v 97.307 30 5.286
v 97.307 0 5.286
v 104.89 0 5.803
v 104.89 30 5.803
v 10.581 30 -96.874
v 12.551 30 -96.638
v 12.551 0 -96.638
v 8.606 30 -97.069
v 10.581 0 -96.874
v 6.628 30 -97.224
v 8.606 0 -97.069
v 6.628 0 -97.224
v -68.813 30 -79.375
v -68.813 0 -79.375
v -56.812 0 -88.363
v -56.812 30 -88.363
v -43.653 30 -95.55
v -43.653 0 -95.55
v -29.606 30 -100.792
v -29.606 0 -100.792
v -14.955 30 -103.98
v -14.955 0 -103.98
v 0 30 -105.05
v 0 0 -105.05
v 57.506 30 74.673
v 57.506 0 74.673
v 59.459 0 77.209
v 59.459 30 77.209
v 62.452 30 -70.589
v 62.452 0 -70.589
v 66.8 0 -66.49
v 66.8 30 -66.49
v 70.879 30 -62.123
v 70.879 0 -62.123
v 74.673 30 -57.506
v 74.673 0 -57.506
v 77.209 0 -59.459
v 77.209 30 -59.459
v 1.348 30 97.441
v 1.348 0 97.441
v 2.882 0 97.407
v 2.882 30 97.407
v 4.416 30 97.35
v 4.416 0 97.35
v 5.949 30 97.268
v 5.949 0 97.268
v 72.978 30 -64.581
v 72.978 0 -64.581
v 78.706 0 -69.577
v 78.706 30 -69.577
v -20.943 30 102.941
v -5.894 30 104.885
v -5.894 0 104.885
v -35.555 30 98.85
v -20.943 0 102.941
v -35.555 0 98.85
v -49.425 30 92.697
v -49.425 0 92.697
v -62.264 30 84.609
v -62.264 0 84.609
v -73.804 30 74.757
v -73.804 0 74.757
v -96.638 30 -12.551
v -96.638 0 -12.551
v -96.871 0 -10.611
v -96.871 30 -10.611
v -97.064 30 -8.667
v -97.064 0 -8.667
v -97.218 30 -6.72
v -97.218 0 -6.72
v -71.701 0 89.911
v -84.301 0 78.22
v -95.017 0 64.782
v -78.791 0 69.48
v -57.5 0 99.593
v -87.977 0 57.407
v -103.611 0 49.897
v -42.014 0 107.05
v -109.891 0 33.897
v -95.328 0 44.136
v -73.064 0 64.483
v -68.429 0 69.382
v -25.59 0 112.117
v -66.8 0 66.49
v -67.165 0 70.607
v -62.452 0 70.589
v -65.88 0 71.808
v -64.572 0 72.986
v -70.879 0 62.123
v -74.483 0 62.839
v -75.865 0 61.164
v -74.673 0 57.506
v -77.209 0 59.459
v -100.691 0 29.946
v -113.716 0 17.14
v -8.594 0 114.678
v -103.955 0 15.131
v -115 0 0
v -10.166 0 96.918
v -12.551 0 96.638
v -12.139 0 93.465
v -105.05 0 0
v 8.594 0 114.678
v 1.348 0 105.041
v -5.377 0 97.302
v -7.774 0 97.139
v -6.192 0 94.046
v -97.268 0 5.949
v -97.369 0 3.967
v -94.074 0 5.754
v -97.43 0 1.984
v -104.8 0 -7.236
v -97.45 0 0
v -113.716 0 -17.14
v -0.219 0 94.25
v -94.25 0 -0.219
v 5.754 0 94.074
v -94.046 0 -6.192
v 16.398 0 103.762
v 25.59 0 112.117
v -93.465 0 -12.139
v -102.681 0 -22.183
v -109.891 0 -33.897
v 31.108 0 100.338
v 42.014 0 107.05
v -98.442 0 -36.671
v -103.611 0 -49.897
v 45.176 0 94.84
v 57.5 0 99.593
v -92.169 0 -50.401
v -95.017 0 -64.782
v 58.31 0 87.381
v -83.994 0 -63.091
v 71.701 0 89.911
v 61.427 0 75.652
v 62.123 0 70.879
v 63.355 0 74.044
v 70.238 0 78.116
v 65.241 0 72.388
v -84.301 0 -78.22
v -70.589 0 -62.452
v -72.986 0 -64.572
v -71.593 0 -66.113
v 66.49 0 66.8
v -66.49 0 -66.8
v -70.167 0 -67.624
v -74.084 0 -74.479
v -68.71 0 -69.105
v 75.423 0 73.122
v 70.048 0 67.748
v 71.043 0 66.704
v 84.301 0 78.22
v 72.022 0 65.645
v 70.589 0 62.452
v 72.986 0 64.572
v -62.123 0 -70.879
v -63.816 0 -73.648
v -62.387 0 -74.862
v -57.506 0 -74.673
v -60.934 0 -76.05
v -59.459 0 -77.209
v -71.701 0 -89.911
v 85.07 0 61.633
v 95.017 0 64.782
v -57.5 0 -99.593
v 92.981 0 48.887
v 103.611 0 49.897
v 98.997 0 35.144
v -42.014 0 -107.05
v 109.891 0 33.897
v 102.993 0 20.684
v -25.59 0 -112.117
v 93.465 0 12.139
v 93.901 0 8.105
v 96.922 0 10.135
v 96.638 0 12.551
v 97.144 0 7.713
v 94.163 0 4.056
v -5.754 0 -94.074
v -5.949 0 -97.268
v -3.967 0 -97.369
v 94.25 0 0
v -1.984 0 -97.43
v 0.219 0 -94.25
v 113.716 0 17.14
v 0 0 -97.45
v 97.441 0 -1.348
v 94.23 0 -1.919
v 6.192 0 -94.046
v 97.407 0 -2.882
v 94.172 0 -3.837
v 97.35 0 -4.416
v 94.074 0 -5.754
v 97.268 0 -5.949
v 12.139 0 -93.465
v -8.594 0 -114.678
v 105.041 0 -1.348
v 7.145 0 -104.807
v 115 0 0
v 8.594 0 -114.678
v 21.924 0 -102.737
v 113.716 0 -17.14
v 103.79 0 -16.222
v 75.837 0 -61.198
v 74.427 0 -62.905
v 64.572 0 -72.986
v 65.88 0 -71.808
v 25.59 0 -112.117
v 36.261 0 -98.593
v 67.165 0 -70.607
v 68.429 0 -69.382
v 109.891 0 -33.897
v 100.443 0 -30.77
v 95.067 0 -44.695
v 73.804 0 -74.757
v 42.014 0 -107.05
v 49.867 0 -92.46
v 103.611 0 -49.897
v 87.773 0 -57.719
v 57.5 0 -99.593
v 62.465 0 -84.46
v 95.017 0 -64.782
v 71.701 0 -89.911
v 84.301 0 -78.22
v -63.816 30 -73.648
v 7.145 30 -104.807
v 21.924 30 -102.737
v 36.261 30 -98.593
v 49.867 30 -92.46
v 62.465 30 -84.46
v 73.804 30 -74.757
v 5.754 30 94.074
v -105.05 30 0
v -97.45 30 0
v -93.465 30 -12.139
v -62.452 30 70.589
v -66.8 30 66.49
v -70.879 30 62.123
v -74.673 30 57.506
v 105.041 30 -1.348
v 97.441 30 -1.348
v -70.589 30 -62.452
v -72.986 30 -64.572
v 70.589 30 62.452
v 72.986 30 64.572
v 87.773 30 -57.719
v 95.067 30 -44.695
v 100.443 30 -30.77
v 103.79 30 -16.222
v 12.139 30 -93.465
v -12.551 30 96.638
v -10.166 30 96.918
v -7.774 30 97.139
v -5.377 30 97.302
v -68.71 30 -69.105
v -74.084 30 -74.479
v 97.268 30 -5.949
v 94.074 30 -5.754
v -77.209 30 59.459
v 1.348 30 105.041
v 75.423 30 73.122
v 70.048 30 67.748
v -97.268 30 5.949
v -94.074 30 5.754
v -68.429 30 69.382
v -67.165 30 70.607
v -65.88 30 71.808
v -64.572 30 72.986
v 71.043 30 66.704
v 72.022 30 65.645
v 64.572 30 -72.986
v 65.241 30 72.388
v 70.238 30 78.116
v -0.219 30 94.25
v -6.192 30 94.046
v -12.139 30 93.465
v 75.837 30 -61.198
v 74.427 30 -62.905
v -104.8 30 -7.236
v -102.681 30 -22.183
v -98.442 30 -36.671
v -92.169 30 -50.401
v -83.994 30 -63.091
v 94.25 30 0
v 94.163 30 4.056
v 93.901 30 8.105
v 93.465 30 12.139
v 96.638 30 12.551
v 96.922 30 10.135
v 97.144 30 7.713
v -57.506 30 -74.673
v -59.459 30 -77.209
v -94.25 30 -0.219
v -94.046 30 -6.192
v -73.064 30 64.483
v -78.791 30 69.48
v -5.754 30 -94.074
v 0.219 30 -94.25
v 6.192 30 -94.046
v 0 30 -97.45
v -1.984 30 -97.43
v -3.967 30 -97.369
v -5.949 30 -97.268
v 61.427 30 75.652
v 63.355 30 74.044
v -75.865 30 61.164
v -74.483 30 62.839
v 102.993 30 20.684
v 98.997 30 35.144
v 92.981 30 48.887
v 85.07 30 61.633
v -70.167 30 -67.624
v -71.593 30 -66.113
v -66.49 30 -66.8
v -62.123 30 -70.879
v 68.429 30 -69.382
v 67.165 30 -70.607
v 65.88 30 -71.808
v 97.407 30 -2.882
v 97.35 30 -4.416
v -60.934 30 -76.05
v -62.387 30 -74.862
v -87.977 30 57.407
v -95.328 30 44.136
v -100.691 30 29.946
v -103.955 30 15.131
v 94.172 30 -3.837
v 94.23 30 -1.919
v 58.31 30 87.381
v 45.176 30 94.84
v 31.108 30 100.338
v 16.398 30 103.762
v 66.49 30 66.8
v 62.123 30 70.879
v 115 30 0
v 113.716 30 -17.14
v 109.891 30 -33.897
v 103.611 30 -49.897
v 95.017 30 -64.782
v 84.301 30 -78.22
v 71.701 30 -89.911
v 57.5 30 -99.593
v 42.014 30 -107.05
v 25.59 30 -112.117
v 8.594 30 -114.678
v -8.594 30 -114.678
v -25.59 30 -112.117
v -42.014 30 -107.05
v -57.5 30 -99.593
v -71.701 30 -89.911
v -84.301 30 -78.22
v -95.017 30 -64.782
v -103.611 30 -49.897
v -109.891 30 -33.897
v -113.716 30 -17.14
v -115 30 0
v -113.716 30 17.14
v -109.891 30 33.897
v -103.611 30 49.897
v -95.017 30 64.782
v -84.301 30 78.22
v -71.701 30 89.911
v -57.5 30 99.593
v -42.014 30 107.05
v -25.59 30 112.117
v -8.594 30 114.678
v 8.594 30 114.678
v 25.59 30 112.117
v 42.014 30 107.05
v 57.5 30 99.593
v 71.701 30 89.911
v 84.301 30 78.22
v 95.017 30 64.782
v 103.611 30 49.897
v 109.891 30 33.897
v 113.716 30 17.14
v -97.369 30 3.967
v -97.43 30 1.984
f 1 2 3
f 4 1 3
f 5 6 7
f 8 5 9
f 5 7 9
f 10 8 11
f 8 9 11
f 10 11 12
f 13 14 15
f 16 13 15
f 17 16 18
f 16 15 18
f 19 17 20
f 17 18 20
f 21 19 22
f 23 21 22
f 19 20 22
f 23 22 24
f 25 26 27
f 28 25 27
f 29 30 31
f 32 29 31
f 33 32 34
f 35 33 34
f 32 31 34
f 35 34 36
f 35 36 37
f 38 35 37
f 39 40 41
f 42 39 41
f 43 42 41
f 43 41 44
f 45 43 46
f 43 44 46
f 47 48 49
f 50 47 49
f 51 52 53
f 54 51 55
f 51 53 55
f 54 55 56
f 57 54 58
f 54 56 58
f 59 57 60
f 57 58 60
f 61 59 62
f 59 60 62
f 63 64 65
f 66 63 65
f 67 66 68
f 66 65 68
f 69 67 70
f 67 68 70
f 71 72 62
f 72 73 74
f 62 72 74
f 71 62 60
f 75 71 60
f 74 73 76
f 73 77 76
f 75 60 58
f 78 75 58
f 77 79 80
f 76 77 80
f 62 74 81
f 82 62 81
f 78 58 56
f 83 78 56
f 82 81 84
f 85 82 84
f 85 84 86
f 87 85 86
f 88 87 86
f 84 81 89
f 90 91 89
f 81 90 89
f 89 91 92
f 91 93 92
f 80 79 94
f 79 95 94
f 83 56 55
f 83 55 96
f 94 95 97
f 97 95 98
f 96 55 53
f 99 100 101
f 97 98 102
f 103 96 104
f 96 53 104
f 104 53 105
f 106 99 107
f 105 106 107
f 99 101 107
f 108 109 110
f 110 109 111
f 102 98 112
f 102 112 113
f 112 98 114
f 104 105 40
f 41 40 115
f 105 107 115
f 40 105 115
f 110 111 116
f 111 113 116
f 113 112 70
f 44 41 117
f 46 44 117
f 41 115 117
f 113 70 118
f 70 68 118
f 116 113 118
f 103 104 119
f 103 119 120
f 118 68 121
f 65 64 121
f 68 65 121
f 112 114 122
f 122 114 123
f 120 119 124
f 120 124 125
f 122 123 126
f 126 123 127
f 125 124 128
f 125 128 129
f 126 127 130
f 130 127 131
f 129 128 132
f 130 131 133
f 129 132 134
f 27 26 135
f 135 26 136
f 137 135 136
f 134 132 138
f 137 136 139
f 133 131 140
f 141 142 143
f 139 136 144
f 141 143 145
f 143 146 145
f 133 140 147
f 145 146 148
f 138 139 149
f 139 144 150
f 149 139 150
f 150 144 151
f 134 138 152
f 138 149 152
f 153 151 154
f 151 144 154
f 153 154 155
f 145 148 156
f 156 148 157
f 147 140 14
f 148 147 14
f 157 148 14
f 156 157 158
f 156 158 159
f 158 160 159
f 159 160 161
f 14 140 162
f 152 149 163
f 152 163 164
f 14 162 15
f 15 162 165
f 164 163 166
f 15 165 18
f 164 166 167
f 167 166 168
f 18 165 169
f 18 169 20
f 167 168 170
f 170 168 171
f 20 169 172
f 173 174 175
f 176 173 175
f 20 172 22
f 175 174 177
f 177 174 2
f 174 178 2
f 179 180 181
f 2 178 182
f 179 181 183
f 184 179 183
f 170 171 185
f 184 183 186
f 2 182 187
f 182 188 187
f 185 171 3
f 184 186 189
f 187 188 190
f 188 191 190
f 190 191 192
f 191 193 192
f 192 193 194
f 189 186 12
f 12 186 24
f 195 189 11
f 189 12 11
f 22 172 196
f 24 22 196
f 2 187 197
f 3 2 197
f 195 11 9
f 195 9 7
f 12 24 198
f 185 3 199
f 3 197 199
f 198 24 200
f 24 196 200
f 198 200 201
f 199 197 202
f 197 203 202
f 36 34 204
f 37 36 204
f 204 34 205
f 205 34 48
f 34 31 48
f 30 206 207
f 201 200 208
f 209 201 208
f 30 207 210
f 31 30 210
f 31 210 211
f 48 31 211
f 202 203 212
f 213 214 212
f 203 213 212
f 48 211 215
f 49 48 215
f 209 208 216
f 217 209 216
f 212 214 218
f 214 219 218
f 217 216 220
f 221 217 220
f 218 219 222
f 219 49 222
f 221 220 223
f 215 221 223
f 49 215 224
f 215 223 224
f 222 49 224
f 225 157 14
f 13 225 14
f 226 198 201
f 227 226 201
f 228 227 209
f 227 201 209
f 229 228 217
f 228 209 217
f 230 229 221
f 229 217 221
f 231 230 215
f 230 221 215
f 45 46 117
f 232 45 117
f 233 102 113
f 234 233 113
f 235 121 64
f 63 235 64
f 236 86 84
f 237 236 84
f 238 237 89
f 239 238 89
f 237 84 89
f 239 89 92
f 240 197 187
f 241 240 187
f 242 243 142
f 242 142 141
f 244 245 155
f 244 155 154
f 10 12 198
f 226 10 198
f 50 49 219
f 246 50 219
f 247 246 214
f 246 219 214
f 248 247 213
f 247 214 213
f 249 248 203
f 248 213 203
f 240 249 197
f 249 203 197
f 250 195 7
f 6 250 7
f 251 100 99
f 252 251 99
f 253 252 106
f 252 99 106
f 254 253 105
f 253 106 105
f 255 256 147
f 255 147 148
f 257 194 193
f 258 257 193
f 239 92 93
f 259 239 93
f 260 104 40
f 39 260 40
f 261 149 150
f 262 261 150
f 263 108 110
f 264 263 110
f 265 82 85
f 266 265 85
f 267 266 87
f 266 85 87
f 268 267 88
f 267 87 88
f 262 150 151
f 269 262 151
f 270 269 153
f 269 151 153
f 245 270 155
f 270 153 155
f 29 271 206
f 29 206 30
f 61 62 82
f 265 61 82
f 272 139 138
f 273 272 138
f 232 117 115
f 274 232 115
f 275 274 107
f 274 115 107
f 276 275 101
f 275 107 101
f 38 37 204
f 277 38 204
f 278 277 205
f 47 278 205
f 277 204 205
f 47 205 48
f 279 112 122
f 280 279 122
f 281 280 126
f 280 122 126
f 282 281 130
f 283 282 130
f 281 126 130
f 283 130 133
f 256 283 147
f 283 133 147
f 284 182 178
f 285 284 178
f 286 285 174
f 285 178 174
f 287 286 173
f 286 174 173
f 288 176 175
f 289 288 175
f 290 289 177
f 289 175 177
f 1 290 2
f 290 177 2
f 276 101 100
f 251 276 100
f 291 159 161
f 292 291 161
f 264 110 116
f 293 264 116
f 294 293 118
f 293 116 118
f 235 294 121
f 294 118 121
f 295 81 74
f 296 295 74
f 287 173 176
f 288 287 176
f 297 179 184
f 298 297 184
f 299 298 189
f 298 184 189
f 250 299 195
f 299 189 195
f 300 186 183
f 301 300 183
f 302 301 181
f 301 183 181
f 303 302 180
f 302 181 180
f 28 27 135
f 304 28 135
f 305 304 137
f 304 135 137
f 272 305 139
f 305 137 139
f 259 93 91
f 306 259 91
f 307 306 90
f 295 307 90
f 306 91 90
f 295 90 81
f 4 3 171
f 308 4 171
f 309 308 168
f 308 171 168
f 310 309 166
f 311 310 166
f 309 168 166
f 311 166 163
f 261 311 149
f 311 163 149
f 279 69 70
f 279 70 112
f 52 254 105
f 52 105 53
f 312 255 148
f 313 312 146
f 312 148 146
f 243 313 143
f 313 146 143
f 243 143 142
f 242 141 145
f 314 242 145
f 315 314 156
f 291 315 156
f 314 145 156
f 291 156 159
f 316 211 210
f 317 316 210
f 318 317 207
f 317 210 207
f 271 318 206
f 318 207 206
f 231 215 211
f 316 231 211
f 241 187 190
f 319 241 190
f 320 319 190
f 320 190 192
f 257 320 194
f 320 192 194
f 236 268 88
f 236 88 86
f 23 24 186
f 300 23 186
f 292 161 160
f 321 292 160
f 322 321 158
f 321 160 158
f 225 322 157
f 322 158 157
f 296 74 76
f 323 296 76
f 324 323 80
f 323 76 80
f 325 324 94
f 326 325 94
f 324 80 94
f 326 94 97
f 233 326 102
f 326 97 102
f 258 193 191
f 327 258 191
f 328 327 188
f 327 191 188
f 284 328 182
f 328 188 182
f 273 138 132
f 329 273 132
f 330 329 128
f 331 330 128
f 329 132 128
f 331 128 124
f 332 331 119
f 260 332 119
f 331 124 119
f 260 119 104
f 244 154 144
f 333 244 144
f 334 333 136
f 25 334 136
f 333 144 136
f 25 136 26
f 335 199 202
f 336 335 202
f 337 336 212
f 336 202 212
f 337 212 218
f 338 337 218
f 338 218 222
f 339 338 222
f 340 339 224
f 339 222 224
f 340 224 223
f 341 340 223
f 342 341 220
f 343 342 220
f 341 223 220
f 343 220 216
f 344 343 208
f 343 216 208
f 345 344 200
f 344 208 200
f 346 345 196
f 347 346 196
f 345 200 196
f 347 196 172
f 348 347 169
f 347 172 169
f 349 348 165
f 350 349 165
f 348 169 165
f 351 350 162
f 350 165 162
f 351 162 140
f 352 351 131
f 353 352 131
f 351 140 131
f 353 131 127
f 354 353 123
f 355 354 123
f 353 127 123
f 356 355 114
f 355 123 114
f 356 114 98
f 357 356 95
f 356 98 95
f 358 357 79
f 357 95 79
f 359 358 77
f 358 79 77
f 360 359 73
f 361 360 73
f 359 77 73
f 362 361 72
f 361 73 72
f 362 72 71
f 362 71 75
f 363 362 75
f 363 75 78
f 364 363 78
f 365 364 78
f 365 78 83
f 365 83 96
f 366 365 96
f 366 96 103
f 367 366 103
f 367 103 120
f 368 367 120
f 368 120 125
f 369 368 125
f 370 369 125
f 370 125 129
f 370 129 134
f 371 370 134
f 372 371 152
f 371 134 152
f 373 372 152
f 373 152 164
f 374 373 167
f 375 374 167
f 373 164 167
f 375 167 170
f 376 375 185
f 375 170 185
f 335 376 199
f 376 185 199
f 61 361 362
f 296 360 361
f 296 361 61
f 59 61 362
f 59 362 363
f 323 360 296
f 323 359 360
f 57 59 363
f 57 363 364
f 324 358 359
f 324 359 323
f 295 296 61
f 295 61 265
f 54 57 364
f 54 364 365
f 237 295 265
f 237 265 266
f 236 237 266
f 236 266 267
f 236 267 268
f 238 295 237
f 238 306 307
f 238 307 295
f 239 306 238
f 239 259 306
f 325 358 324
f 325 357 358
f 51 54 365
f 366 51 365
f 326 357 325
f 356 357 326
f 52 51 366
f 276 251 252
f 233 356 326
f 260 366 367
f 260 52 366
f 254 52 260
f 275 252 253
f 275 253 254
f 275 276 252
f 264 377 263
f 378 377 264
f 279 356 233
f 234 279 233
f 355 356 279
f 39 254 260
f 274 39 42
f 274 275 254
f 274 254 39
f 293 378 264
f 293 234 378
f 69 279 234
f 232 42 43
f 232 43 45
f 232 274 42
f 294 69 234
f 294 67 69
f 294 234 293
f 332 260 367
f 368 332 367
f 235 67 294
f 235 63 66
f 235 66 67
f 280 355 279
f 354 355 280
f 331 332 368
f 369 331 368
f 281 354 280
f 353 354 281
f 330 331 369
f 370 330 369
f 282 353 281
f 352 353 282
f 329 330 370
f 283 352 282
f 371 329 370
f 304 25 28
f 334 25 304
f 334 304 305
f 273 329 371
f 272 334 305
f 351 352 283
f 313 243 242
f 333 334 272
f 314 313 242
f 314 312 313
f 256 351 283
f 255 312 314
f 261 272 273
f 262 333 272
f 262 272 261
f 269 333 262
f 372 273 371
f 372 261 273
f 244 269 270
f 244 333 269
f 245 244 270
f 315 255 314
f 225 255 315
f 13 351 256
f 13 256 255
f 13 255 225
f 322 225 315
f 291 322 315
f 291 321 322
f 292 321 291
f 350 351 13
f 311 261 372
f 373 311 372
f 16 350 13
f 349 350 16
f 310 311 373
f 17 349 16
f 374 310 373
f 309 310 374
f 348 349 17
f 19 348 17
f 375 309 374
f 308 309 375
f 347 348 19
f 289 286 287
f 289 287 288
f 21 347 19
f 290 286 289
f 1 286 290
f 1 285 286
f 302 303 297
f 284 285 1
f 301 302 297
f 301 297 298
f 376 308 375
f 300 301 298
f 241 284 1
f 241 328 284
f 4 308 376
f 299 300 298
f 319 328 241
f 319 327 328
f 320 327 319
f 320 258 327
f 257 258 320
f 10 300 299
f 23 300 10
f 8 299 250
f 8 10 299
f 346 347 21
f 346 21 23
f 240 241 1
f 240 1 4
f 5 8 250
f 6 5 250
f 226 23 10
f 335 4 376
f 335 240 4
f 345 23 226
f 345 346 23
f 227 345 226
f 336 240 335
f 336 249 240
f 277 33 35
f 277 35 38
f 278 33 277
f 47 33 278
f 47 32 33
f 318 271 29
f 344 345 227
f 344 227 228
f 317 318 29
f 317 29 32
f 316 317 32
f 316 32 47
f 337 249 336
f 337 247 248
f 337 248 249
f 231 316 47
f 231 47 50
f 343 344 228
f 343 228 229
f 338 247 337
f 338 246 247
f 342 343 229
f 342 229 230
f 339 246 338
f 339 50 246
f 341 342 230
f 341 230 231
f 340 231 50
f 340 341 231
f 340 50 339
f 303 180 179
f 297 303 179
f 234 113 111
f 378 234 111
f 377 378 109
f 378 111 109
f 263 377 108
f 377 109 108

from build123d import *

# Parameters (mm, degrees)
SKETCH1_R           = 115
BOSS_EXTRUDE1_DEPTH = 30


with BuildPart() as part:
    # Sketch1 → Boss-Extrude1 (new body)
    with BuildSketch(Plane(origin=(0, 0, 0), x_dir=(1, 0, 0), z_dir=(0, 1, 0))):
        Circle(SKETCH1_R)
        with BuildLine():
            Line((0, 105.05), (0, 97.45))
            ThreePointArc((0, 97.45), (-2.975978112, 97.404548427), (-5.949180178, 97.268236106))
            Line((-5.949180178, 97.268236106), (-5.753824851, 94.074204751))
            ThreePointArc((-5.753824851, 94.074204751), (3.207077785, 94.195420016), (12.138984977, 93.465007055))
            Line((12.138984977, 93.465007055), (12.551130886, 96.638354774))
            ThreePointArc((12.551130886, 96.638354774), (9.59408525, 96.976574636), (6.628090075, 97.224332973))
            Line((6.628090075, 97.224332973), (7.145006284, 104.806733492))
            ThreePointArc((7.145006284, 104.806733492), (43.173122748, 95.768387123), (73.803507095, 74.756570551))
            Line((73.803507095, 74.756570551), (68.429376346, 69.382439802))
            ThreePointArc((68.429376346, 69.382439802), (66.525250753, 71.210206517), (64.572323699, 72.985734991))
            Line((64.572323699, 72.985734991), (62.451939544, 70.589076684))
            ThreePointArc((62.451939544, 70.589076684), (68.8739667, 64.338473801), (74.673298886, 57.506181698))
            Line((74.673298886, 57.506181698), (77.208625745, 59.458646222))
            ThreePointArc((77.208625745, 59.458646222), (75.137185677, 62.055667175), (72.978432671, 64.580576529))
            Line((72.978432671, 64.580576529), (78.705648152, 69.576745031))
            ThreePointArc((78.705648152, 69.576745031), (98.00273537, 37.828115999), (105.041353, 1.347835265))
            Line((105.041353, 1.347835265), (97.44067857, 1.347835265))
            ThreePointArc((97.44067857, 1.347835265), (97.381638194, 3.649526366), (97.268236106, 5.949180178))
            Line((97.268236106, 5.949180178), (94.074204751, 5.753824851))
            ThreePointArc((94.074204751, 5.753824851), (94.206040936, 2.87825487), (94.25, 0))
            ThreePointArc((94.25, 0), (94.053547022, -6.082170053), (93.465007055, -12.138984977))
            Line((93.465007055, -12.138984977), (96.638354774, -12.551130886))
            ThreePointArc((96.638354774, -12.551130886), (97.040462342, -8.92475033), (97.306537269, -5.285858937))
            Line((97.306537269, -5.285858937), (104.889607544, -5.802820805))
            ThreePointArc((104.889607544, -5.802820805), (96.234836599, -42.123137642), (75.423107292, -73.122208571))
            Line((75.423107292, -73.122208571), (70.048400827, -67.747502106))
            ThreePointArc((70.048400827, -67.747502106), (71.534686983, -66.176212178), (72.985734991, -64.572323699))
            Line((72.985734991, -64.572323699), (70.589076684, -62.451939544))
            ThreePointArc((70.589076684, -62.451939544), (64.338473801, -68.8739667), (57.506181698, -74.673298886))
            Line((57.506181698, -74.673298886), (59.458646222, -77.208625745))
            ThreePointArc((59.458646222, -77.208625745), (62.396629618, -74.854279185), (65.241478394, -72.388203438))
            Line((65.241478394, -72.388203438), (70.238137515, -78.115981326))
            ThreePointArc((70.238137515, -78.115981326), (38.241100725, -97.842325787), (1.347835265, -105.041353))
            Line((1.347835265, -105.041353), (1.347835265, -97.44067857))
            ThreePointArc((1.347835265, -97.44067857), (3.649526366, -97.381638194), (5.949180178, -97.268236106))
            Line((5.949180178, -97.268236106), (5.753824851, -94.074204751))
            ThreePointArc((5.753824851, -94.074204751), (-3.207077785, -94.195420016), (-12.138984977, -93.465007055))
            Line((-12.138984977, -93.465007055), (-12.551130886, -96.638354774))
            ThreePointArc((-12.551130886, -96.638354774), (-8.97039747, -97.036253376), (-5.377403168, -97.301521238))
            Line((-5.377403168, -97.301521238), (-5.894359023, -104.884503296))
            ThreePointArc((-5.894359023, -104.884503296), (-42.601180134, -96.024173786), (-73.803507095, -74.756570551))
            Line((-73.803507095, -74.756570551), (-68.429376346, -69.382439802))
            ThreePointArc((-68.429376346, -69.382439802), (-66.525250753, -71.210206517), (-64.572323699, -72.985734991))
            Line((-64.572323699, -72.985734991), (-62.451939544, -70.589076684))
            ThreePointArc((-62.451939544, -70.589076684), (-68.8739667, -64.338473801), (-74.673298886, -57.506181698))
            Line((-74.673298886, -57.506181698), (-77.208625745, -59.458646222))
            ThreePointArc((-77.208625745, -59.458646222), (-75.178448793, -62.005671814), (-73.064286712, -64.48342816))
            Line((-73.064286712, -64.48342816), (-78.791456749, -69.479557018))
            ThreePointArc((-78.791456749, -69.479557018), (-98.2663346, -37.137985733), (-105.05, 0))
            Line((-105.05, 0), (-97.45, 0))
            ThreePointArc((-97.45, 0), (-97.404548427, -2.975978112), (-97.268236106, -5.949180178))
            Line((-97.268236106, -5.949180178), (-94.074204751, -5.753824851))
            ThreePointArc((-94.074204751, -5.753824851), (-94.195420016, 3.207077785), (-93.465007055, 12.138984977))
            Line((-93.465007055, 12.138984977), (-96.638354774, 12.551130886))
            ThreePointArc((-96.638354774, 12.551130886), (-96.972051222, 9.639698217), (-97.218054759, 6.71954826))
            Line((-97.218054759, 6.71954826), (-104.800458391, 7.236464681))
            ThreePointArc((-104.800458391, 7.236464681), (-95.552521618, 43.64880425), (-74.083919205, 74.478691014))
            Line((-74.083919205, 74.478691014), (-68.709887215, 69.104659024))
            ThreePointArc((-68.709887215, 69.104659024), (-70.88404513, 66.872674883), (-72.985734991, 64.572323699))
            Line((-72.985734991, 64.572323699), (-70.589076684, 62.451939544))
            ThreePointArc((-70.589076684, 62.451939544), (-64.338473801, 68.8739667), (-57.506181698, 74.673298886))
            Line((-57.506181698, 74.673298886), (-59.458646222, 77.208625745))
            ThreePointArc((-59.458646222, 77.208625745), (-61.663262597, 75.459555697), (-63.816455081, 73.647556381))
            Line((-63.816455081, 73.647556381), (-68.812532618, 79.374667588))
            ThreePointArc((-68.812532618, 79.374667588), (-36.72324652, 98.422079154), (0, 105.05))
        make_face(mode=Mode.SUBTRACT)
    extrude(amount=BOSS_EXTRUDE1_DEPTH)


solid = part.part
